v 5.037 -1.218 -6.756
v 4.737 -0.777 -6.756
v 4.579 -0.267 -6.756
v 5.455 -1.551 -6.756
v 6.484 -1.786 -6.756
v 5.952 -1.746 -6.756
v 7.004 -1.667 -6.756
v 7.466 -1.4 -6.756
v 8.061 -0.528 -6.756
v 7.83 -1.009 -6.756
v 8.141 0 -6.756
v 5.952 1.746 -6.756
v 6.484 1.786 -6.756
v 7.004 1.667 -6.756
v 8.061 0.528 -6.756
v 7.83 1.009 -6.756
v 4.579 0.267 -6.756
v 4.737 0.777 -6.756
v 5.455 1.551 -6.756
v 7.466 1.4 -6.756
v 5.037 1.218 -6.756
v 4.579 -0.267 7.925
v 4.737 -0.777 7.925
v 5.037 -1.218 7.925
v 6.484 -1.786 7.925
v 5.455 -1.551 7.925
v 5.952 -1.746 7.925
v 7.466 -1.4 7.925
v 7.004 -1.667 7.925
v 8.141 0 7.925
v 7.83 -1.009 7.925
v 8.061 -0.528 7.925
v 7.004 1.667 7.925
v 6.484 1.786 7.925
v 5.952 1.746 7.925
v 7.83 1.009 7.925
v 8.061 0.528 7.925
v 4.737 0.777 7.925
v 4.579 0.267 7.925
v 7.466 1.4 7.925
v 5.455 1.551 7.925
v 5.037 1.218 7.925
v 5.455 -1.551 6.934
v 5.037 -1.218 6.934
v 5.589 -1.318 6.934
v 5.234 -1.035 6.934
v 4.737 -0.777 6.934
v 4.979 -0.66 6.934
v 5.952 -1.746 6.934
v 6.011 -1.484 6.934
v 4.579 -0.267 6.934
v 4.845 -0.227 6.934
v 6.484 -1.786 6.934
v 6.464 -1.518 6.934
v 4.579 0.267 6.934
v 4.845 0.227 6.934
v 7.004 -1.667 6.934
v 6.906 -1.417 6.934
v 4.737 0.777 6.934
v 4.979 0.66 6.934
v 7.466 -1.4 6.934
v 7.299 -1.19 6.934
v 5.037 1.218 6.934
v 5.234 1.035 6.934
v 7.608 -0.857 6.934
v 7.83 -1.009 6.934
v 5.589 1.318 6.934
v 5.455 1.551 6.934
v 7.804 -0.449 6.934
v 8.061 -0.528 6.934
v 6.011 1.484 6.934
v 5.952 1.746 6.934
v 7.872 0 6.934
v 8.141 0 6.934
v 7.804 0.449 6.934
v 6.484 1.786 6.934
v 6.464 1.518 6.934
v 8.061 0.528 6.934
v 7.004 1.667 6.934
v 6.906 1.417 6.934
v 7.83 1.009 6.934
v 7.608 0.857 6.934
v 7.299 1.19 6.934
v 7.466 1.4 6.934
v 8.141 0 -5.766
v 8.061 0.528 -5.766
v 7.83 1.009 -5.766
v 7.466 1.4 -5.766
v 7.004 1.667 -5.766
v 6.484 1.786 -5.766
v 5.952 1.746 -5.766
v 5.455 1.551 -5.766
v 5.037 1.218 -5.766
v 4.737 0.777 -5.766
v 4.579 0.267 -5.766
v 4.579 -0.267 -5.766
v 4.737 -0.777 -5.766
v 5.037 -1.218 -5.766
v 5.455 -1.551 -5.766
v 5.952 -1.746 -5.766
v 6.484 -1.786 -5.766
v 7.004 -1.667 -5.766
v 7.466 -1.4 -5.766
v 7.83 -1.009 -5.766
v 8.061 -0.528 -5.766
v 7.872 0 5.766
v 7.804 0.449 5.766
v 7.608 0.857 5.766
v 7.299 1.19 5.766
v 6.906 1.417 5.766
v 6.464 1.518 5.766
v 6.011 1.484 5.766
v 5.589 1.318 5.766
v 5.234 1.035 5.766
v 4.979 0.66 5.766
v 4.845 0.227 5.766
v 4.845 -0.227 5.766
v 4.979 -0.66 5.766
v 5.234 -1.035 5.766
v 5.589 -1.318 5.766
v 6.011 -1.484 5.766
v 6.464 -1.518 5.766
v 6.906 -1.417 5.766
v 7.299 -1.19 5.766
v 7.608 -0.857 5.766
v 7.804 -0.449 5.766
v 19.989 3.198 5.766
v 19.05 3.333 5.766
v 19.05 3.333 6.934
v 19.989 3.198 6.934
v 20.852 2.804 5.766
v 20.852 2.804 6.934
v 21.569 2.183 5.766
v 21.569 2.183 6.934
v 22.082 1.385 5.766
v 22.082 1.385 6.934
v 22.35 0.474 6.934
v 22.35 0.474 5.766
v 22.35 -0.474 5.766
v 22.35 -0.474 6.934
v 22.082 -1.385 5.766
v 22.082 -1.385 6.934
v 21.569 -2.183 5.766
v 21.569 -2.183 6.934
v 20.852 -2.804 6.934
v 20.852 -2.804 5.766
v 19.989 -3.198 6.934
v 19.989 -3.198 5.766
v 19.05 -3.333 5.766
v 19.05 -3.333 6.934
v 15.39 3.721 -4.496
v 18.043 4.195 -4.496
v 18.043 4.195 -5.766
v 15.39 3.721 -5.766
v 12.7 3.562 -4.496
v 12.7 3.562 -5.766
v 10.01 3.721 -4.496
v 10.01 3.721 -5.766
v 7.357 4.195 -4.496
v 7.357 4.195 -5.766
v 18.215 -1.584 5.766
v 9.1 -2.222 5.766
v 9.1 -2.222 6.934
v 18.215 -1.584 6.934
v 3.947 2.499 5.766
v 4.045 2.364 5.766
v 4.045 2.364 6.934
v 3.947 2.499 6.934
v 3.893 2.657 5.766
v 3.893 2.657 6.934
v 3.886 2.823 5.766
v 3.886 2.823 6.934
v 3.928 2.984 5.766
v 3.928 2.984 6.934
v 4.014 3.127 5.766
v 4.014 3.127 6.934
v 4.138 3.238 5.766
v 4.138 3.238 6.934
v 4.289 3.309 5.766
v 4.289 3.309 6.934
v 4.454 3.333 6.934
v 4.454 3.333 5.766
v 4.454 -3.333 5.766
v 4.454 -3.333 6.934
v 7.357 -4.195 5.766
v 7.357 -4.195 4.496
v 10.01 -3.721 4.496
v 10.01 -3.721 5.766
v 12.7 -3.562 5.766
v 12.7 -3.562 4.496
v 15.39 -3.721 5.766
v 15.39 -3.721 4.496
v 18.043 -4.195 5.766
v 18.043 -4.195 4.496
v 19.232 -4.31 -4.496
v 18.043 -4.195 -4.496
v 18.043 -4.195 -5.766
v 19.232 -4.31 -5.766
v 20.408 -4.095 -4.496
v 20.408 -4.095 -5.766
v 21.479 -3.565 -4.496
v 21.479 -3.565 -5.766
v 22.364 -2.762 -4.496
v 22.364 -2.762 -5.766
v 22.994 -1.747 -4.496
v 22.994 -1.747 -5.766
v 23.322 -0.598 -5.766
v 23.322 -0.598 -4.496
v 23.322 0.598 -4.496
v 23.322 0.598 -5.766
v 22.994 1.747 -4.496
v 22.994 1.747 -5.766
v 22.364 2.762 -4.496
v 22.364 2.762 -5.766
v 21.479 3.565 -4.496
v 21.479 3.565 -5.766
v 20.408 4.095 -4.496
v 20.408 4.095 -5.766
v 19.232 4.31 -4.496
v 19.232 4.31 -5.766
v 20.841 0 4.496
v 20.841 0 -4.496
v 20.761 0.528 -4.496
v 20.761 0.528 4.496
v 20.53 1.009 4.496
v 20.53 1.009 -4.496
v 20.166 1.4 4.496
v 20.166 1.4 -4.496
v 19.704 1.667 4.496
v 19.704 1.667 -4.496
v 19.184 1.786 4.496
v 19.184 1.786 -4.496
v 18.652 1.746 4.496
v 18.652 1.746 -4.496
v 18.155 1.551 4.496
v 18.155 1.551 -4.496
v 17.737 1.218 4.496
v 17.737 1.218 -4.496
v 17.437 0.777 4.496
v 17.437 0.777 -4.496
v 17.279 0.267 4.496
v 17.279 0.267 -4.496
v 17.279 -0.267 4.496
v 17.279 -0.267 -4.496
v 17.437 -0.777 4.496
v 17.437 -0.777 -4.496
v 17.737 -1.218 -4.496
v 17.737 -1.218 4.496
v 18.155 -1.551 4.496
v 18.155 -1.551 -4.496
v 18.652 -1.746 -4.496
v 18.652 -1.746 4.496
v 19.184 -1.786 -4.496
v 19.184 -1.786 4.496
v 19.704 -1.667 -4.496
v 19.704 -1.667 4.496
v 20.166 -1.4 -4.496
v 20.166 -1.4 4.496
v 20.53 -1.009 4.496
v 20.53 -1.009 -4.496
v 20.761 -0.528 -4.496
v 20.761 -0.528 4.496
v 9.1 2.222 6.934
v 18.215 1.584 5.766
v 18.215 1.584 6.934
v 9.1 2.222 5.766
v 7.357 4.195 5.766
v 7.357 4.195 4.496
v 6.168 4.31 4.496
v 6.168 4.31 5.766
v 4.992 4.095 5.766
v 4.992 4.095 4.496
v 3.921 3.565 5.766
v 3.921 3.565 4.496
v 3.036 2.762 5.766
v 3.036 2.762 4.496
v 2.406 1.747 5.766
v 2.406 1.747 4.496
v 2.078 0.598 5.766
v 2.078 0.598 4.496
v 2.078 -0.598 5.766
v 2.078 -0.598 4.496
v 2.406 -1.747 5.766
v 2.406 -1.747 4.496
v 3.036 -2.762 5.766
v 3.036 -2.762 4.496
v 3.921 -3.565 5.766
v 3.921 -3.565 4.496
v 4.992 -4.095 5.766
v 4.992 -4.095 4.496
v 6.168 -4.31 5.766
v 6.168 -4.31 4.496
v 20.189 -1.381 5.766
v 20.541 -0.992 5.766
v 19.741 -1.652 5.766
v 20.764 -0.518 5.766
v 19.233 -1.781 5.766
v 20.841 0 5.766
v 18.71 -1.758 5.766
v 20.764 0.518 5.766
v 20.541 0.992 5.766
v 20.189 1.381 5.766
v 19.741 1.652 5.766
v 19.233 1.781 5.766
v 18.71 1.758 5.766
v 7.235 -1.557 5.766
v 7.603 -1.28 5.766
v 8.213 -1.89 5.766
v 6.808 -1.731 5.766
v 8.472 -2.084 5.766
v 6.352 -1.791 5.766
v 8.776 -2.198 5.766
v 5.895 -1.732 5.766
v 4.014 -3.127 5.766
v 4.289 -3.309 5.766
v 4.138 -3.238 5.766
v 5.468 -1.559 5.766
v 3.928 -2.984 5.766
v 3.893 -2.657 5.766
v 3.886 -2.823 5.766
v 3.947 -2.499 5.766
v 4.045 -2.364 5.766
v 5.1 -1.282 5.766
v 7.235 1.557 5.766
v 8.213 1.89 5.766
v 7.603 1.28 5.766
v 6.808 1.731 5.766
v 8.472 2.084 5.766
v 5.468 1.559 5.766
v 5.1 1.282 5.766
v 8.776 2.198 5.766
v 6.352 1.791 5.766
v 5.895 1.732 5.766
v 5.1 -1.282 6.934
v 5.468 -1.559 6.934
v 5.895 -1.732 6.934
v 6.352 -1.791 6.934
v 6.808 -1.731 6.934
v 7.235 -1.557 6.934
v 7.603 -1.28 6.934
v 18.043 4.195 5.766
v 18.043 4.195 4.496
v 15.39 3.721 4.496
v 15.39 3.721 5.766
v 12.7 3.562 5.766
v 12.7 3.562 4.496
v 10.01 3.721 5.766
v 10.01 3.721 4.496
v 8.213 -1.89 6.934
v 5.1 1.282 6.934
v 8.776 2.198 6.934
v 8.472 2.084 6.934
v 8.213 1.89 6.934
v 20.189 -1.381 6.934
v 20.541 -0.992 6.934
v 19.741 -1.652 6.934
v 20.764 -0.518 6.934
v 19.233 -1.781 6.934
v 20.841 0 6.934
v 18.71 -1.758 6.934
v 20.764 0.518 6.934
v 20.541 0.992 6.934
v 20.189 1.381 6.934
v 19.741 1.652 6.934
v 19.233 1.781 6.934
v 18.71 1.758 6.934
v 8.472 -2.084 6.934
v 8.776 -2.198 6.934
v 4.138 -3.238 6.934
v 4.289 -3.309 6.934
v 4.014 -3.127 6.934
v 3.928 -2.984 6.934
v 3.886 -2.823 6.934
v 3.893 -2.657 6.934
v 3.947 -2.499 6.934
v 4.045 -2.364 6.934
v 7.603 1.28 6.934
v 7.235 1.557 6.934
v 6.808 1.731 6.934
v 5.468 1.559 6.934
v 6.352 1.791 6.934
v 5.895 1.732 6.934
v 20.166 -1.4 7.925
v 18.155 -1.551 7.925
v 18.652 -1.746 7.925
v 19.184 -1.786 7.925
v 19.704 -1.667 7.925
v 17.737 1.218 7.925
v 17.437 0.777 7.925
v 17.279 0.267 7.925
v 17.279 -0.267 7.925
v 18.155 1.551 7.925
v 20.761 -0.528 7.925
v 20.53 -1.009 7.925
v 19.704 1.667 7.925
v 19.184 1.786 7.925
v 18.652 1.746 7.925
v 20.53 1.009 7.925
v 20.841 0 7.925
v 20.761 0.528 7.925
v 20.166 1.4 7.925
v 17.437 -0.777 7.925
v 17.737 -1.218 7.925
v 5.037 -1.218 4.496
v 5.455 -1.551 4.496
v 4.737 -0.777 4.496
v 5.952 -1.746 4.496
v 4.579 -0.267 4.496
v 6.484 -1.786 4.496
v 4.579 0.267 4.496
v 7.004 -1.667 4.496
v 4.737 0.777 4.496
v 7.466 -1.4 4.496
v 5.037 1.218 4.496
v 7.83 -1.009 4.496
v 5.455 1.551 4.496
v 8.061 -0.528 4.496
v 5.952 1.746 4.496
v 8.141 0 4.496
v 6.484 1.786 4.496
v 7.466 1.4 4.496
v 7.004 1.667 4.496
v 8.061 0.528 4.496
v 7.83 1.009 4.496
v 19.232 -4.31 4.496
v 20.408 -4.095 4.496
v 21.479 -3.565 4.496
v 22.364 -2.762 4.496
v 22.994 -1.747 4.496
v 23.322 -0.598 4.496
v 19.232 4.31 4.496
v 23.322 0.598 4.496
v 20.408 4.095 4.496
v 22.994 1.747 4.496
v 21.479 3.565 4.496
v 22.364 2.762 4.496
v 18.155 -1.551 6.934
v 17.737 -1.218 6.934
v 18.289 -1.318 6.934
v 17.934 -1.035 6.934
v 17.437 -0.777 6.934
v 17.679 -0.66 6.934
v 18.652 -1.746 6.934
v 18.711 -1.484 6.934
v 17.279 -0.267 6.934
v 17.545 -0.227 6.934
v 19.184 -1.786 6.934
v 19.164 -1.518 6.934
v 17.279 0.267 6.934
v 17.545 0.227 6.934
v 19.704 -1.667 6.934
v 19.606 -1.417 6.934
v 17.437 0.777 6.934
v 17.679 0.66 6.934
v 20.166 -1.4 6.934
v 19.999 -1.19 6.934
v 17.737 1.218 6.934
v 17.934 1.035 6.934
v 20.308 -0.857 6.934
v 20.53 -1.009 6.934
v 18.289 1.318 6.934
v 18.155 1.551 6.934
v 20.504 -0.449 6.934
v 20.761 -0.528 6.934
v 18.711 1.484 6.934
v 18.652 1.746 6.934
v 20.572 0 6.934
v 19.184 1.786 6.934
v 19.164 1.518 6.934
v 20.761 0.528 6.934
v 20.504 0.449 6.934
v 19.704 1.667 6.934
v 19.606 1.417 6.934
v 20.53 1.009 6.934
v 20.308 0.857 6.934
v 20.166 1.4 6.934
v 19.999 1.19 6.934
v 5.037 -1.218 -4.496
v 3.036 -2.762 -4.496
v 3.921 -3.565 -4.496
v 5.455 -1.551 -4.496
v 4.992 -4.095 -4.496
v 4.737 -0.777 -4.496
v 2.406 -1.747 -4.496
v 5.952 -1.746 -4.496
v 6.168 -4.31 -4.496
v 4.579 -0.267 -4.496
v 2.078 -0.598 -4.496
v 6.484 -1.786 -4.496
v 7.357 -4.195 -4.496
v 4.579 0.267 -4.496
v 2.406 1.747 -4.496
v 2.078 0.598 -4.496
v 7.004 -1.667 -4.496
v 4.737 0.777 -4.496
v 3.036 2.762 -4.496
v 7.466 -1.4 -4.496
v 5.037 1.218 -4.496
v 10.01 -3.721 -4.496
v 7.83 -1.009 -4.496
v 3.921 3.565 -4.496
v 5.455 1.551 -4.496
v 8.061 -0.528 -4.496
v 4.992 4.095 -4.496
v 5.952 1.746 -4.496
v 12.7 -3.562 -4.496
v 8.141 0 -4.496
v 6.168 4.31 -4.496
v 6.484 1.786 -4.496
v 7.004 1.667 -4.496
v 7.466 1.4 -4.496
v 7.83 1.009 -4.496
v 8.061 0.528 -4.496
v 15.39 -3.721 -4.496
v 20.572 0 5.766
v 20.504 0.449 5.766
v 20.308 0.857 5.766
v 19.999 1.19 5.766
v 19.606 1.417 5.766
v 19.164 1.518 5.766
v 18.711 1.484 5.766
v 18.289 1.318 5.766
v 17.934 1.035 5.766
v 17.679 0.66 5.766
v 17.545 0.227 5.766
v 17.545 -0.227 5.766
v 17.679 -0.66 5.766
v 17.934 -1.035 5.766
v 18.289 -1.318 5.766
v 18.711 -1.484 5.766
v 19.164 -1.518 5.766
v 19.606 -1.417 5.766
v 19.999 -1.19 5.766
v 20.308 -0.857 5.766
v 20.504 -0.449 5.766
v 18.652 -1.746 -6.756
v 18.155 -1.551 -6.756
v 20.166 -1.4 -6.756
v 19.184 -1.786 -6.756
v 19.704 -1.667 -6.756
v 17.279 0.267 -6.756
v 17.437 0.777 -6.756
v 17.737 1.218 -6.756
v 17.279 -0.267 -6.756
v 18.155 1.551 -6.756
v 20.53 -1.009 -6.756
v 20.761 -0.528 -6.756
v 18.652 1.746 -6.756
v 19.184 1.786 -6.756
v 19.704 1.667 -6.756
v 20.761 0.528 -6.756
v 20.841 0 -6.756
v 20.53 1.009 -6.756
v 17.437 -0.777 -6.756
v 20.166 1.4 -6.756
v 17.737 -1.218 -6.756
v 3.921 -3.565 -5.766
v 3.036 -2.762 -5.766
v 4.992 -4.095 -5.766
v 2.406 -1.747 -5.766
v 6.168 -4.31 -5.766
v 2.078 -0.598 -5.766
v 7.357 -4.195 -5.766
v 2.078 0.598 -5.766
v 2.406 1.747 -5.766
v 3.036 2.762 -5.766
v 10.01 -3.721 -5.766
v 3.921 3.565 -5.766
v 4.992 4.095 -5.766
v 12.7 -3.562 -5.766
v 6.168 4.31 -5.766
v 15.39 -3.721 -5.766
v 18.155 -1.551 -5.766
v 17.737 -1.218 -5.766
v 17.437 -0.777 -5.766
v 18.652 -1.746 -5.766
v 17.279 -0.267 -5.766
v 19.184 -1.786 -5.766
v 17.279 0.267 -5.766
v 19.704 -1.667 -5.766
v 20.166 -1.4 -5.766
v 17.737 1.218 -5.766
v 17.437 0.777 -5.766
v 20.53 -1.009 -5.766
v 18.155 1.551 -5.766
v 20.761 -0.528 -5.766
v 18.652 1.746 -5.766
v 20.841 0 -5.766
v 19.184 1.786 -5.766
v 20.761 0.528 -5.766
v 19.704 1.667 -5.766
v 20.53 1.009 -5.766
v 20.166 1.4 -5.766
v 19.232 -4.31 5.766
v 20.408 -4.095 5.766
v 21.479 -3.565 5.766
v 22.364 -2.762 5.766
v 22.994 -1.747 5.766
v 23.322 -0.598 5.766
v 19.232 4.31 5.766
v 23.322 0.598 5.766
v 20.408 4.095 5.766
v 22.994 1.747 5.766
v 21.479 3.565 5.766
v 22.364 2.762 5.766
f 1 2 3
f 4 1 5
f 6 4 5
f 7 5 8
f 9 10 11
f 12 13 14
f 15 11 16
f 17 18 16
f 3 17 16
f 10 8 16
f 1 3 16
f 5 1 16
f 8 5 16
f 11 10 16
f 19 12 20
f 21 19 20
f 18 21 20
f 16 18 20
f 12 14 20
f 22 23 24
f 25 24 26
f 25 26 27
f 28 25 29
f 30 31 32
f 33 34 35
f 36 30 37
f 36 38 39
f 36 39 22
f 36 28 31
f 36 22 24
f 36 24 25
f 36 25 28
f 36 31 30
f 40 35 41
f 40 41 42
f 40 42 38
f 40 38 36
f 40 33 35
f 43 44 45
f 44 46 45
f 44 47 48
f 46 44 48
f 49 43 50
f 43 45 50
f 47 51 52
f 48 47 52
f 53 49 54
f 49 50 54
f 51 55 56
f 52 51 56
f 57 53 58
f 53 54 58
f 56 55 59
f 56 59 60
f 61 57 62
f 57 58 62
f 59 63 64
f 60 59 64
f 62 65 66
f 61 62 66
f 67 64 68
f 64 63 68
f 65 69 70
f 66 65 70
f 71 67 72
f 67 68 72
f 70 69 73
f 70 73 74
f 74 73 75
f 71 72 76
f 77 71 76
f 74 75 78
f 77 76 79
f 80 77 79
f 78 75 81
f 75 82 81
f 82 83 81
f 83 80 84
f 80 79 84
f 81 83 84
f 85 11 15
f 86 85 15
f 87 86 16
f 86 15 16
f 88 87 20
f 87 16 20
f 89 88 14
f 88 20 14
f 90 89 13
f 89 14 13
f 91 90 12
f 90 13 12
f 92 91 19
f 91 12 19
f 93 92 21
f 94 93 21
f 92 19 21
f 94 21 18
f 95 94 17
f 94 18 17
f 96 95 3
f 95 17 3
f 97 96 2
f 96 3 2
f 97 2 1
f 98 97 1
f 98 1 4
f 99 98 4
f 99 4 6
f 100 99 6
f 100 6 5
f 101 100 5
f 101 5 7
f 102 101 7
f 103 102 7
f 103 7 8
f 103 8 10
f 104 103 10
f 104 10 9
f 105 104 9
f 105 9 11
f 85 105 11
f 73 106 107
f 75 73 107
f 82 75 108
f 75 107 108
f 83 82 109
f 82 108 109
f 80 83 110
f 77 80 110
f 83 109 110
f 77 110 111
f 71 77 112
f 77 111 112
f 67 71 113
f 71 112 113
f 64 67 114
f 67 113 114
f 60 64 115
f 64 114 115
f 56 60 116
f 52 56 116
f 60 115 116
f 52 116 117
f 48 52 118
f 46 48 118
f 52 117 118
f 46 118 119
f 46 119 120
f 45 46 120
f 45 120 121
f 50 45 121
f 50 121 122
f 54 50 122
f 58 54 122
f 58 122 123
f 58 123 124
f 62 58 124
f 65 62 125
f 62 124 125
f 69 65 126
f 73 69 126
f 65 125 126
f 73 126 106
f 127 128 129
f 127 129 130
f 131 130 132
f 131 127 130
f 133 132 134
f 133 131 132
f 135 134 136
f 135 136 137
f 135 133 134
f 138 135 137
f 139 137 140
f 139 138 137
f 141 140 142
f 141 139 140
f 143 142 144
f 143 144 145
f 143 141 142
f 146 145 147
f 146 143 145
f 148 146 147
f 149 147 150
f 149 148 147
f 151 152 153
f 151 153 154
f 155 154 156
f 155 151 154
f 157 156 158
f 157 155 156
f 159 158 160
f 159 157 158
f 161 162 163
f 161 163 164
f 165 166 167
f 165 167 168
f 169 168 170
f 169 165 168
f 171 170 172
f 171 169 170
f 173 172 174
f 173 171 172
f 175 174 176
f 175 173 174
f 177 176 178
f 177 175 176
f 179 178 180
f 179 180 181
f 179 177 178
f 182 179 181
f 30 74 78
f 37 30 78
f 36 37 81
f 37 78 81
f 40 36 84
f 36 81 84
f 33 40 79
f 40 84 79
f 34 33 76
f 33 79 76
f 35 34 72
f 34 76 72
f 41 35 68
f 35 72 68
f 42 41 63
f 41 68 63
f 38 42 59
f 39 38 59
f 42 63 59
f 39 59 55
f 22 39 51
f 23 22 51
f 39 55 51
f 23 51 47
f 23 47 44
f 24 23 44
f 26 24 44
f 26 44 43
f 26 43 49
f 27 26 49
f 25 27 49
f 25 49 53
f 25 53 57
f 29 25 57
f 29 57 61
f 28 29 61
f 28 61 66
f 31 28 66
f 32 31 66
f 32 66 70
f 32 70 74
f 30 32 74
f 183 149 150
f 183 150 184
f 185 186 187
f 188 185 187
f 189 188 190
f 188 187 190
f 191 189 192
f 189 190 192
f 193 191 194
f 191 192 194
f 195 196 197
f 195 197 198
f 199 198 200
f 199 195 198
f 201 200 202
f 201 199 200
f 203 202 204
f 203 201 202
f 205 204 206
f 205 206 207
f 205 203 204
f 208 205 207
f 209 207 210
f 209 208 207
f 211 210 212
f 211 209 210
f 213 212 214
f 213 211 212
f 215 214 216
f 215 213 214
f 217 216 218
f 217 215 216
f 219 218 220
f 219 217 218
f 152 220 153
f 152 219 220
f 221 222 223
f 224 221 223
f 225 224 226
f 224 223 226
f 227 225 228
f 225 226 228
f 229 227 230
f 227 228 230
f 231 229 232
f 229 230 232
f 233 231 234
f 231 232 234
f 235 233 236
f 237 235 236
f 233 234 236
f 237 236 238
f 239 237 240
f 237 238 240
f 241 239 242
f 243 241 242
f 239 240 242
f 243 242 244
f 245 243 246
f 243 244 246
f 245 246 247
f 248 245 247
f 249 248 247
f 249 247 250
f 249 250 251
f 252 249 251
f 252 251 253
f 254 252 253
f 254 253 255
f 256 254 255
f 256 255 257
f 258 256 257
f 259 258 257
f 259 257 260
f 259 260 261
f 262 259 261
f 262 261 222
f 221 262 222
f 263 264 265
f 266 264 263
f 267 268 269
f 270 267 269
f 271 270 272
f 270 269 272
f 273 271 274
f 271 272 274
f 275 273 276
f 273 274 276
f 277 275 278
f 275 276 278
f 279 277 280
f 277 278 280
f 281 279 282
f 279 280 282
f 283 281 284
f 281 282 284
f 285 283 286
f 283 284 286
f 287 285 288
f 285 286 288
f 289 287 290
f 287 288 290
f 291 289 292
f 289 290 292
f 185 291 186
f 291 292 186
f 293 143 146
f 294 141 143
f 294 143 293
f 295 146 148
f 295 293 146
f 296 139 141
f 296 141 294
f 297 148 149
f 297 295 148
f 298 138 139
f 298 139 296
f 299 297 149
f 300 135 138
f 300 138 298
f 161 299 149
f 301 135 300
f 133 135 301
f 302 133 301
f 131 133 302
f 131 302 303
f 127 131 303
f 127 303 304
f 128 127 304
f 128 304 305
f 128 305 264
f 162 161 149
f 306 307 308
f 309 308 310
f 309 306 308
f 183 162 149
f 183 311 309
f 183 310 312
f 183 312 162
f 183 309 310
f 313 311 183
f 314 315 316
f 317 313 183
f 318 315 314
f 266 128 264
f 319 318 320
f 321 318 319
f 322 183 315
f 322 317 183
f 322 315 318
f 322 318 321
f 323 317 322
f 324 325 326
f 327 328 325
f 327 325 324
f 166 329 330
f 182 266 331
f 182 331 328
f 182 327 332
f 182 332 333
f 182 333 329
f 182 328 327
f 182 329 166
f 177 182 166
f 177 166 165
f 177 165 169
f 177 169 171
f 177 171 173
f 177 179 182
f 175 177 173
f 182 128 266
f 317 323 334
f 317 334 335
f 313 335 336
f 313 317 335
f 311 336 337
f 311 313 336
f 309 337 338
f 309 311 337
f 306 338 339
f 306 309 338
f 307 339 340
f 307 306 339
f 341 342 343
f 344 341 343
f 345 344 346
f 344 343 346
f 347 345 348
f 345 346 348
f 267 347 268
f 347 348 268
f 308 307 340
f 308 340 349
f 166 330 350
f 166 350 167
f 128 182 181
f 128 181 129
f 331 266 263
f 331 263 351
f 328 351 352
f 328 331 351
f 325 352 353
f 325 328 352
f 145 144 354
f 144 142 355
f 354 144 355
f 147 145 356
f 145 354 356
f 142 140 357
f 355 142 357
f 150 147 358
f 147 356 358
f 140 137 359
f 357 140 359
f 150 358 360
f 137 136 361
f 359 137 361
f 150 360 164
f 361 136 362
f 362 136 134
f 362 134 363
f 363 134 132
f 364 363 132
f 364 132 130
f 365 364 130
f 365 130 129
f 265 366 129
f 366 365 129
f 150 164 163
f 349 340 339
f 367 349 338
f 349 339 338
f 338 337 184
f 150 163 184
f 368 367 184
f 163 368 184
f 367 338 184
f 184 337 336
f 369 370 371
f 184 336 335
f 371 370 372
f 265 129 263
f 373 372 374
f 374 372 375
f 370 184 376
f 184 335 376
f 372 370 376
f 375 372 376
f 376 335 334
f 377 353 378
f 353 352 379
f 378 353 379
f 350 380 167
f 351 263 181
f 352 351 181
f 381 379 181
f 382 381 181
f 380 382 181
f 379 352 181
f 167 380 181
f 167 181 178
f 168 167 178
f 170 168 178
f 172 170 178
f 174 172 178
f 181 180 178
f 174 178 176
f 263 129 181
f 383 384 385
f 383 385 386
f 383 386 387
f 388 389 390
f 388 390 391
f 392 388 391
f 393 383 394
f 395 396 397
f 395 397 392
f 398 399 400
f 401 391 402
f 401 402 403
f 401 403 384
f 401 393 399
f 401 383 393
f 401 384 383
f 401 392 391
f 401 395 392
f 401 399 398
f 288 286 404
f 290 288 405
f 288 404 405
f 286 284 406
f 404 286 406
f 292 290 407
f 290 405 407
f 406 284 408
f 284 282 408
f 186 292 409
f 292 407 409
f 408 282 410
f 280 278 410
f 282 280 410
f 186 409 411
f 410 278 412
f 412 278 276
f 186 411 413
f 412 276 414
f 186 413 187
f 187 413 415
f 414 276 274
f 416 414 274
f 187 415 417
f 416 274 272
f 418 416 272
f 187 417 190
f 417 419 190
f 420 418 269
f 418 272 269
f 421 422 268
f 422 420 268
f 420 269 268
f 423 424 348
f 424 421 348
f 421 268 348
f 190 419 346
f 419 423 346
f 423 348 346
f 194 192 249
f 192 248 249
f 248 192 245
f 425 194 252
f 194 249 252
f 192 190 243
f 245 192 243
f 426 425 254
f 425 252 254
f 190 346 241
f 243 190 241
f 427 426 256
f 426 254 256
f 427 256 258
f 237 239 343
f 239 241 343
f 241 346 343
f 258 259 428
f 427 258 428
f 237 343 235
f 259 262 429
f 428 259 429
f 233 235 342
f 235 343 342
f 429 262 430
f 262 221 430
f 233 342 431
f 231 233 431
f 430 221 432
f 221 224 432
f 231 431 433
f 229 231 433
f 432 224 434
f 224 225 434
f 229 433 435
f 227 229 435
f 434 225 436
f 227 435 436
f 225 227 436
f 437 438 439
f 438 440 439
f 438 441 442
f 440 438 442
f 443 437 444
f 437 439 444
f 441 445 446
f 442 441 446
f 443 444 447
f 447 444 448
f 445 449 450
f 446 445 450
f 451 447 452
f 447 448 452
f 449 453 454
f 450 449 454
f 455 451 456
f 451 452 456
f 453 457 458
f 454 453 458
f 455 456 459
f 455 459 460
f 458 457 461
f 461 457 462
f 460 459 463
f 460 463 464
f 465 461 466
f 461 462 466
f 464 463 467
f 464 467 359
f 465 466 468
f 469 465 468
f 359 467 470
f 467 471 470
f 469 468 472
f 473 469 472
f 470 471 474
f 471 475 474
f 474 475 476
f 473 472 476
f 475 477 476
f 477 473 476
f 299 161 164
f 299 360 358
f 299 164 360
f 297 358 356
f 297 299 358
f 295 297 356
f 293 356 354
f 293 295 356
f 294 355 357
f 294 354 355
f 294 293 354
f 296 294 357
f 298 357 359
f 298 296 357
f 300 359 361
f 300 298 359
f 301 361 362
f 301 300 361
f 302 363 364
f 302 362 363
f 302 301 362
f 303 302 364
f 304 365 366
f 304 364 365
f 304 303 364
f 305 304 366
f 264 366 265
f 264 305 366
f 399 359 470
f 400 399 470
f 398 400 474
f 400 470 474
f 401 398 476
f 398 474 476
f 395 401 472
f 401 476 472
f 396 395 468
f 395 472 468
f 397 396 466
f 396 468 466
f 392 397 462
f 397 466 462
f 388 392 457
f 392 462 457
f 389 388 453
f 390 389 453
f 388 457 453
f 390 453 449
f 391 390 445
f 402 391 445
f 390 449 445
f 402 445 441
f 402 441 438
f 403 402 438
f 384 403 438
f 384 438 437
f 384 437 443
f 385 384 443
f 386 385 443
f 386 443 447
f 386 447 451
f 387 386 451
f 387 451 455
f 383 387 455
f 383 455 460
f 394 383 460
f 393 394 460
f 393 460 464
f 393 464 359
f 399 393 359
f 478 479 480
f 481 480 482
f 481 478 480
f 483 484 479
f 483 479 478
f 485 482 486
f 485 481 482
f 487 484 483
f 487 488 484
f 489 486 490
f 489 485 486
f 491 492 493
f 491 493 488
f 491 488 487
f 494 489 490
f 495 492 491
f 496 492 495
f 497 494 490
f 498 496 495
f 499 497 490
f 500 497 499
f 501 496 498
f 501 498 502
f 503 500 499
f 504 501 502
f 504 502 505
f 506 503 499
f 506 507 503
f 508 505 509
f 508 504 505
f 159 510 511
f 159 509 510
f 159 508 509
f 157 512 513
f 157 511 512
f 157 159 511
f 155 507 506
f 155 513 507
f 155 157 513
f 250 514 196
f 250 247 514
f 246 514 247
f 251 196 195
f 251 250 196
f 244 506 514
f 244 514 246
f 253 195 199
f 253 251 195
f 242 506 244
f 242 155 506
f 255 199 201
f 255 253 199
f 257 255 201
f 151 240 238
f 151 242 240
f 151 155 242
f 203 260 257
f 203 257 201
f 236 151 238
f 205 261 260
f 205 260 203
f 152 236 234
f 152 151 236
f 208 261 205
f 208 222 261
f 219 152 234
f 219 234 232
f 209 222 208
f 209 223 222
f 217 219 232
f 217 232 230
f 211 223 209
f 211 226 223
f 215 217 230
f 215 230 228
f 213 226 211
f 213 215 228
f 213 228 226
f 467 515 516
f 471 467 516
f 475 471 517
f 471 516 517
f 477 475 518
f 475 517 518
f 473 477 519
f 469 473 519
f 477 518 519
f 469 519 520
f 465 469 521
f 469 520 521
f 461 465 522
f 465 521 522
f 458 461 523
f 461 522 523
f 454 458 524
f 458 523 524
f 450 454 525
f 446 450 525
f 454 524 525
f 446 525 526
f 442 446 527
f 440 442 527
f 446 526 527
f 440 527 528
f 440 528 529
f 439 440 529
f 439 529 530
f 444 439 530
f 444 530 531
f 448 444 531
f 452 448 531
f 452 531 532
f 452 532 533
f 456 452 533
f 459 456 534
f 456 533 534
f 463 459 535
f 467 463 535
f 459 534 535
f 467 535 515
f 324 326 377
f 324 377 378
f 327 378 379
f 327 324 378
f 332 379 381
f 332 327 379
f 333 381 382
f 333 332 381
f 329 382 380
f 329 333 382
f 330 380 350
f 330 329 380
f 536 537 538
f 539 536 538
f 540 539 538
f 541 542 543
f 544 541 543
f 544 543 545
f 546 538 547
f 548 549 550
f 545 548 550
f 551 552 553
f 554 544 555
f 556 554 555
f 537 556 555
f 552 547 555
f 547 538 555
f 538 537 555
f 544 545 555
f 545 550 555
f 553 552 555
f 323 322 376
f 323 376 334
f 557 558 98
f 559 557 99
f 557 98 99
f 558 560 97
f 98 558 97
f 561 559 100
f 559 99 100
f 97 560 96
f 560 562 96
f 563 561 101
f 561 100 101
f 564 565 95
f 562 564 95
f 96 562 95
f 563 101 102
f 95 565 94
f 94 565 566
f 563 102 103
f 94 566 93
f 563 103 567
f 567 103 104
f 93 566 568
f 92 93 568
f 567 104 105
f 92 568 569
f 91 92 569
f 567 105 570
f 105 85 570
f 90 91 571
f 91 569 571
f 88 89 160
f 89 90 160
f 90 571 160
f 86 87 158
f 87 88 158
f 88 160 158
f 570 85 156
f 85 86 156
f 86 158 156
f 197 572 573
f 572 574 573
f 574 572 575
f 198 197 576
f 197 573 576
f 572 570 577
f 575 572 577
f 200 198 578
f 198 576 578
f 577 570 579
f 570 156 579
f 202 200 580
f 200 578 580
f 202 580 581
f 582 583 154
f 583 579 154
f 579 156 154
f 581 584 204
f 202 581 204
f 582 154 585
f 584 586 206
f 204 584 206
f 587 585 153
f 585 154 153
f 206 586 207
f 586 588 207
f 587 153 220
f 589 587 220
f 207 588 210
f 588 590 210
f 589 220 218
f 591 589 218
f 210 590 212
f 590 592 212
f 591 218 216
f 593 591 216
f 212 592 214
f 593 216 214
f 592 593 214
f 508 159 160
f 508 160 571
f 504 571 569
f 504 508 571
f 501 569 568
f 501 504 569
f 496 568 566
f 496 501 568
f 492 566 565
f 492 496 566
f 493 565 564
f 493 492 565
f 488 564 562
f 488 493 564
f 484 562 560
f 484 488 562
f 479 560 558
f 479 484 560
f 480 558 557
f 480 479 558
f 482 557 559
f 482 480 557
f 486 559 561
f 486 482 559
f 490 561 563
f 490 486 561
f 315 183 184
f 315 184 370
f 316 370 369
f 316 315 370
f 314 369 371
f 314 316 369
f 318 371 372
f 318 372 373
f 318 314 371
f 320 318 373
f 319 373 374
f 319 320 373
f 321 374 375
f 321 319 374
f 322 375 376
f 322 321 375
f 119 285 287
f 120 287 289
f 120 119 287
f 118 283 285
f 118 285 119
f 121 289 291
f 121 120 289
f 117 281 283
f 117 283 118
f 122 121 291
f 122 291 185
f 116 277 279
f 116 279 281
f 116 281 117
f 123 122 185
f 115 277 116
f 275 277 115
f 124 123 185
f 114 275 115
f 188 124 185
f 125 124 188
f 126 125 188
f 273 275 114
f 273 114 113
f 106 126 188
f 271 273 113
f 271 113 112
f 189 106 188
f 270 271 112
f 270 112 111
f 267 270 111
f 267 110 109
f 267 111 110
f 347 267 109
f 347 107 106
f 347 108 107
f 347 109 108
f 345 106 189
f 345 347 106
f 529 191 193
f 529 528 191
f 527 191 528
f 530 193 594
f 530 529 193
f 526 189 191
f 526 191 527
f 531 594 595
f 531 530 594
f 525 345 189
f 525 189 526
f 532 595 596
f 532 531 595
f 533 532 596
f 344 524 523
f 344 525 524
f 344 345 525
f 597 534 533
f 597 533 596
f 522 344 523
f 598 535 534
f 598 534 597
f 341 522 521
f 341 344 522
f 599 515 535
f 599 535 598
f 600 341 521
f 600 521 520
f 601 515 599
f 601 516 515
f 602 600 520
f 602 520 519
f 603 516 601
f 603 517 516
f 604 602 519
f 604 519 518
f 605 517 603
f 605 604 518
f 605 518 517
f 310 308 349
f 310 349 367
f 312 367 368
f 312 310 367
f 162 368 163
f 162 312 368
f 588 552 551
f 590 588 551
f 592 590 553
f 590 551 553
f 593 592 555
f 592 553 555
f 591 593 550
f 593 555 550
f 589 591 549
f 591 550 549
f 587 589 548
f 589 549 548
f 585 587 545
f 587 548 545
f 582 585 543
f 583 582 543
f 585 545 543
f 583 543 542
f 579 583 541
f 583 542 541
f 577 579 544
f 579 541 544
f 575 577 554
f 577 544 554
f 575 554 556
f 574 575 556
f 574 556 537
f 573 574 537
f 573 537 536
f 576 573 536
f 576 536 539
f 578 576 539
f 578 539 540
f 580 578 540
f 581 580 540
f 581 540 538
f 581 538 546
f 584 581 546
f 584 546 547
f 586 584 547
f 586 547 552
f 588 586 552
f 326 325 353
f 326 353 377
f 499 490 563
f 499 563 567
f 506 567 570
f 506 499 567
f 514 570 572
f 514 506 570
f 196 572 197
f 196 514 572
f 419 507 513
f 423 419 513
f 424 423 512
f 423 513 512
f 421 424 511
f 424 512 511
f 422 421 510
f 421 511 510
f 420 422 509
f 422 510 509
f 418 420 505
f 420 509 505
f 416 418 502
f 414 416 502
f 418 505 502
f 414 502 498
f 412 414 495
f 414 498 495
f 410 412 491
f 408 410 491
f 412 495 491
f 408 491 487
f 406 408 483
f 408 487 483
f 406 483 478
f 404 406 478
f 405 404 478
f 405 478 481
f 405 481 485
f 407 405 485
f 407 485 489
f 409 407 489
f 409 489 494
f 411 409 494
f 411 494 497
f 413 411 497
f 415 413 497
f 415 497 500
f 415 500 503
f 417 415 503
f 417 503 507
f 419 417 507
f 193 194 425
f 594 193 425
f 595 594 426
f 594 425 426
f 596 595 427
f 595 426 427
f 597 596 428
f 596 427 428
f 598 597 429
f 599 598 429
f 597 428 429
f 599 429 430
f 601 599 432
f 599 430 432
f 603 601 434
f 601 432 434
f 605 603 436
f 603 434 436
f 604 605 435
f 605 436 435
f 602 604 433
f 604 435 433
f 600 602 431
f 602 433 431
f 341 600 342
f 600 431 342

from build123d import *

# Parameters (mm, degrees)
SKETCH4_R                  = 3.8862
SKETCH4_R_2                = 1.8161
BOSS_EXTRUDE1_DEPTH        = 3.175
SKETCH5_R                  = 1.7907
BOSS_EXTRUDE2_DEPTH        = 1.27
LPATTERN1_COUNT            = 2
LPATTERN1_PITCH            = 12.7
SKETCH7_R                  = 1.7907
BOSS_EXTRUDE3_DEPTH        = 1.27
MIRROR1_START              = 4.4958
MIRROR1_OUTLINE_R          = 1.7907
MIRROR1_DEPTH              = 1.27
BOSS_EXTRUDE4_DEPTH        = 7.9248
BOSS_EXTRUDE4_DEPTH_BACK   = 6.7564
SKETCH8_R                  = 1.7907
BOSS_EXTRUDE4_2_DEPTH      = 7.9248
BOSS_EXTRUDE4_2_DEPTH_BACK = 6.7564
BOSS_EXTRUDE5_DEPTH        = 1.1684
SKETCH12_R                 = 1.7907
SKETCH12_R_2               = 1.522095
CUT_EXTRUDE1_DEPTH         = 1.1684


# Read off the part's stored shape, not the designer's step: Mirror1
with BuildPart() as part:
    # Sketch4 → Boss-Extrude1 (new, symmetric)
    with BuildSketch(Plane.XY):
        with Locations((6.35, 0)):
            Circle(SKETCH4_R)
        with Locations((6.35, 0)):
            Circle(SKETCH4_R_2, mode=Mode.SUBTRACT)
    extrude(amount=BOSS_EXTRUDE1_DEPTH, both=True)


with BuildPart() as body_2:
    # Sketch5 → Boss-Extrude2 (new body)
    with BuildSketch(Plane.XY.offset(3.175)):
        with BuildLine():
            ThreePointArc((-5.229673653, 4.772466209), (-11.2522, 0), (-5.229673653, -4.772466209))
            ThreePointArc((-5.229673653, -4.772466209), (0, -4.16687), (5.229673653, -4.772466209))
            ThreePointArc((5.229673653, -4.772466209), (11.2522, 0), (5.229673653, 4.772466209))
            ThreePointArc((5.229673653, 4.772466209), (0, 4.16687), (-5.229673653, 4.772466209))
        make_face()
        with Locations((-6.35, 0)):
            Circle(SKETCH5_R, mode=Mode.SUBTRACT)
        with Locations((6.35, 0)):
            Circle(SKETCH5_R, mode=Mode.SUBTRACT)
    extrude(amount=BOSS_EXTRUDE2_DEPTH)


with BuildPart() as lpattern1_1:
    # LPattern1: pattern copy
    add(part.part.moved(Location(Vector(1, 0, 0) * (1 * LPATTERN1_PITCH))))


with BuildPart() as body_4:
    # Sketch7 → Boss-Extrude3 (new body)
    with BuildSketch(Plane.XY.offset(-4.4958)):
        with BuildLine():
            ThreePointArc((7.357211383, 4.194707265), (2.036064, 0), (7.357211383, -4.194707265))
            ThreePointArc((7.357211383, -4.194707265), (12.7, -3.562254201), (18.042788617, -4.194707265))
            ThreePointArc((18.042788617, -4.194707265), (23.363936, 0), (18.042788617, 4.194707265))
            ThreePointArc((18.042788617, 4.194707265), (12.7, 3.562254201), (7.357211383, 4.194707265))
        make_face()
        with Locations((6.35, 0)):
            Circle(SKETCH7_R, mode=Mode.SUBTRACT)
        with Locations((19.05, 0)):
            Circle(SKETCH7_R, mode=Mode.SUBTRACT)
    extrude(amount=-BOSS_EXTRUDE3_DEPTH)


with BuildPart() as body_5:
    # Mirror1 outline → Mirror1 (new body)
    with BuildSketch(Plane.XY.offset(MIRROR1_START)):
        with BuildLine():
            ThreePointArc((18.042788617, -4.194707265), (23.363936, 0), (18.042788617, 4.194707265))
            ThreePointArc((18.042788617, 4.194707265), (12.7, 3.562254201), (7.357211383, 4.194707265))
            ThreePointArc((7.357211383, 4.194707265), (2.036064, 0), (7.357211383, -4.194707265))
            ThreePointArc((7.357211383, -4.194707265), (12.7, -3.562254201), (18.042788617, -4.194707265))
        make_face()
        with Locations((6.35, 0)):
            Circle(MIRROR1_OUTLINE_R, mode=Mode.SUBTRACT)
        with Locations((19.05, 0)):
            Circle(MIRROR1_OUTLINE_R, mode=Mode.SUBTRACT)
    extrude(amount=MIRROR1_DEPTH)


with BuildPart() as body_3:
    # Sketch8 → Boss-Extrude4 (new, two sides: drawn at the far end of the back side and taken through both)
    with BuildSketch(Plane.XY.offset(-BOSS_EXTRUDE4_DEPTH_BACK)):
        with Locations((6.35, 0)):
            Circle(SKETCH8_R)
    extrude(amount=BOSS_EXTRUDE4_DEPTH + BOSS_EXTRUDE4_DEPTH_BACK)


with BuildPart() as body_4_2:
    # Sketch8 → Boss-Extrude4 2 (new, two sides: drawn at the far end of the back side and taken through both)
    with BuildSketch(Plane.XY.offset(-BOSS_EXTRUDE4_2_DEPTH_BACK)):
        with Locations((19.05, 0)):
            Circle(SKETCH8_R)
    extrude(amount=BOSS_EXTRUDE4_2_DEPTH + BOSS_EXTRUDE4_2_DEPTH_BACK)


with BuildPart() as body_5_2:
    # Sketch10 → Boss-Extrude5 (new body)
    with BuildSketch(Plane.XY.offset(5.7658)):
        with BuildLine():
            Line((19.05, -3.333496), (4.453566335, -3.333496))
            ThreePointArc((4.453566335, -3.333496), (3.927622666, -2.984474861), (4.044881806, -2.364246845))
            Line((4.044881806, -2.364246845), (5.287430585, -1.089825412))
            ThreePointArc((5.287430585, -1.089825412), (6.35, -1.522095), (7.412569415, -1.089825412))
            Line((7.412569415, -1.089825412), (8.212776406, -1.890032403))
            ThreePointArc((8.212776406, -1.890032403), (8.6202025, -2.152097673), (9.099621163, -2.221610071))
            Line((9.099621163, -2.221610071), (19.15617598, -1.518387253))
            ThreePointArc((19.15617598, -1.518387253), (20.572095, 0), (19.15617598, 1.518387253))
            Line((19.15617598, 1.518387253), (9.099621163, 2.221610071))
            ThreePointArc((9.099621163, 2.221610071), (8.6202025, 2.152097673), (8.212776406, 1.890032403))
            Line((8.212776406, 1.890032403), (7.412569415, 1.089825412))
            ThreePointArc((7.412569415, 1.089825412), (6.35, 1.522095), (5.287430585, 1.089825412))
            Line((5.287430585, 1.089825412), (4.044881806, 2.364246845))
            ThreePointArc((4.044881806, 2.364246845), (3.927622666, 2.984474861), (4.453566335, 3.333496))
            Line((4.453566335, 3.333496), (19.05, 3.333496))
            ThreePointArc((19.05, 3.333496), (22.383496, 0), (19.05, -3.333496))
        make_face()
    extrude(amount=BOSS_EXTRUDE5_DEPTH)


with BuildPart() as cut_extrude1_tool:
    # Sketch12 → Cut-Extrude1 (new body)
    # profile 1 of 2: a face of its own
    with BuildSketch(Plane.XY.offset(5.7658)):
        with Locations((6.35, 0)):
            Circle(SKETCH12_R)
        with Locations((6.35, 0)):
            Circle(SKETCH12_R_2, mode=Mode.SUBTRACT)
    # profile 2 of 2: a face of its own
    with BuildSketch(Plane.XY.offset(5.7658)):
        with Locations((19.05, 0)):
            Circle(SKETCH12_R)
        with Locations((19.05, 0)):
            Circle(SKETCH12_R_2, mode=Mode.SUBTRACT)
    extrude(amount=CUT_EXTRUDE1_DEPTH)


with BuildPart() as body_3_1:
    add(body_3.part)

    # Cut-Extrude1: cut by cut_extrude1_tool
    add(cut_extrude1_tool.part, mode=Mode.SUBTRACT)


with BuildPart() as body_4_2_1:
    add(body_4_2.part)

    # Cut-Extrude1: cut by cut_extrude1_tool
    add(cut_extrude1_tool.part, mode=Mode.SUBTRACT)


with BuildPart() as body_5_2_1:
    add(body_5_2.part)

    # Cut-Extrude1: cut by cut_extrude1_tool
    add(cut_extrude1_tool.part, mode=Mode.SUBTRACT)


with BuildPart() as body_4_1:
    add(body_4.part)

    # Combine3: union body 5, body 4 2, body 3
    add(body_5.part)
    add(body_4_2_1.part)
    add(body_3_1.part)


solid = Compound([body_5_2_1.part, body_4_1.part])
